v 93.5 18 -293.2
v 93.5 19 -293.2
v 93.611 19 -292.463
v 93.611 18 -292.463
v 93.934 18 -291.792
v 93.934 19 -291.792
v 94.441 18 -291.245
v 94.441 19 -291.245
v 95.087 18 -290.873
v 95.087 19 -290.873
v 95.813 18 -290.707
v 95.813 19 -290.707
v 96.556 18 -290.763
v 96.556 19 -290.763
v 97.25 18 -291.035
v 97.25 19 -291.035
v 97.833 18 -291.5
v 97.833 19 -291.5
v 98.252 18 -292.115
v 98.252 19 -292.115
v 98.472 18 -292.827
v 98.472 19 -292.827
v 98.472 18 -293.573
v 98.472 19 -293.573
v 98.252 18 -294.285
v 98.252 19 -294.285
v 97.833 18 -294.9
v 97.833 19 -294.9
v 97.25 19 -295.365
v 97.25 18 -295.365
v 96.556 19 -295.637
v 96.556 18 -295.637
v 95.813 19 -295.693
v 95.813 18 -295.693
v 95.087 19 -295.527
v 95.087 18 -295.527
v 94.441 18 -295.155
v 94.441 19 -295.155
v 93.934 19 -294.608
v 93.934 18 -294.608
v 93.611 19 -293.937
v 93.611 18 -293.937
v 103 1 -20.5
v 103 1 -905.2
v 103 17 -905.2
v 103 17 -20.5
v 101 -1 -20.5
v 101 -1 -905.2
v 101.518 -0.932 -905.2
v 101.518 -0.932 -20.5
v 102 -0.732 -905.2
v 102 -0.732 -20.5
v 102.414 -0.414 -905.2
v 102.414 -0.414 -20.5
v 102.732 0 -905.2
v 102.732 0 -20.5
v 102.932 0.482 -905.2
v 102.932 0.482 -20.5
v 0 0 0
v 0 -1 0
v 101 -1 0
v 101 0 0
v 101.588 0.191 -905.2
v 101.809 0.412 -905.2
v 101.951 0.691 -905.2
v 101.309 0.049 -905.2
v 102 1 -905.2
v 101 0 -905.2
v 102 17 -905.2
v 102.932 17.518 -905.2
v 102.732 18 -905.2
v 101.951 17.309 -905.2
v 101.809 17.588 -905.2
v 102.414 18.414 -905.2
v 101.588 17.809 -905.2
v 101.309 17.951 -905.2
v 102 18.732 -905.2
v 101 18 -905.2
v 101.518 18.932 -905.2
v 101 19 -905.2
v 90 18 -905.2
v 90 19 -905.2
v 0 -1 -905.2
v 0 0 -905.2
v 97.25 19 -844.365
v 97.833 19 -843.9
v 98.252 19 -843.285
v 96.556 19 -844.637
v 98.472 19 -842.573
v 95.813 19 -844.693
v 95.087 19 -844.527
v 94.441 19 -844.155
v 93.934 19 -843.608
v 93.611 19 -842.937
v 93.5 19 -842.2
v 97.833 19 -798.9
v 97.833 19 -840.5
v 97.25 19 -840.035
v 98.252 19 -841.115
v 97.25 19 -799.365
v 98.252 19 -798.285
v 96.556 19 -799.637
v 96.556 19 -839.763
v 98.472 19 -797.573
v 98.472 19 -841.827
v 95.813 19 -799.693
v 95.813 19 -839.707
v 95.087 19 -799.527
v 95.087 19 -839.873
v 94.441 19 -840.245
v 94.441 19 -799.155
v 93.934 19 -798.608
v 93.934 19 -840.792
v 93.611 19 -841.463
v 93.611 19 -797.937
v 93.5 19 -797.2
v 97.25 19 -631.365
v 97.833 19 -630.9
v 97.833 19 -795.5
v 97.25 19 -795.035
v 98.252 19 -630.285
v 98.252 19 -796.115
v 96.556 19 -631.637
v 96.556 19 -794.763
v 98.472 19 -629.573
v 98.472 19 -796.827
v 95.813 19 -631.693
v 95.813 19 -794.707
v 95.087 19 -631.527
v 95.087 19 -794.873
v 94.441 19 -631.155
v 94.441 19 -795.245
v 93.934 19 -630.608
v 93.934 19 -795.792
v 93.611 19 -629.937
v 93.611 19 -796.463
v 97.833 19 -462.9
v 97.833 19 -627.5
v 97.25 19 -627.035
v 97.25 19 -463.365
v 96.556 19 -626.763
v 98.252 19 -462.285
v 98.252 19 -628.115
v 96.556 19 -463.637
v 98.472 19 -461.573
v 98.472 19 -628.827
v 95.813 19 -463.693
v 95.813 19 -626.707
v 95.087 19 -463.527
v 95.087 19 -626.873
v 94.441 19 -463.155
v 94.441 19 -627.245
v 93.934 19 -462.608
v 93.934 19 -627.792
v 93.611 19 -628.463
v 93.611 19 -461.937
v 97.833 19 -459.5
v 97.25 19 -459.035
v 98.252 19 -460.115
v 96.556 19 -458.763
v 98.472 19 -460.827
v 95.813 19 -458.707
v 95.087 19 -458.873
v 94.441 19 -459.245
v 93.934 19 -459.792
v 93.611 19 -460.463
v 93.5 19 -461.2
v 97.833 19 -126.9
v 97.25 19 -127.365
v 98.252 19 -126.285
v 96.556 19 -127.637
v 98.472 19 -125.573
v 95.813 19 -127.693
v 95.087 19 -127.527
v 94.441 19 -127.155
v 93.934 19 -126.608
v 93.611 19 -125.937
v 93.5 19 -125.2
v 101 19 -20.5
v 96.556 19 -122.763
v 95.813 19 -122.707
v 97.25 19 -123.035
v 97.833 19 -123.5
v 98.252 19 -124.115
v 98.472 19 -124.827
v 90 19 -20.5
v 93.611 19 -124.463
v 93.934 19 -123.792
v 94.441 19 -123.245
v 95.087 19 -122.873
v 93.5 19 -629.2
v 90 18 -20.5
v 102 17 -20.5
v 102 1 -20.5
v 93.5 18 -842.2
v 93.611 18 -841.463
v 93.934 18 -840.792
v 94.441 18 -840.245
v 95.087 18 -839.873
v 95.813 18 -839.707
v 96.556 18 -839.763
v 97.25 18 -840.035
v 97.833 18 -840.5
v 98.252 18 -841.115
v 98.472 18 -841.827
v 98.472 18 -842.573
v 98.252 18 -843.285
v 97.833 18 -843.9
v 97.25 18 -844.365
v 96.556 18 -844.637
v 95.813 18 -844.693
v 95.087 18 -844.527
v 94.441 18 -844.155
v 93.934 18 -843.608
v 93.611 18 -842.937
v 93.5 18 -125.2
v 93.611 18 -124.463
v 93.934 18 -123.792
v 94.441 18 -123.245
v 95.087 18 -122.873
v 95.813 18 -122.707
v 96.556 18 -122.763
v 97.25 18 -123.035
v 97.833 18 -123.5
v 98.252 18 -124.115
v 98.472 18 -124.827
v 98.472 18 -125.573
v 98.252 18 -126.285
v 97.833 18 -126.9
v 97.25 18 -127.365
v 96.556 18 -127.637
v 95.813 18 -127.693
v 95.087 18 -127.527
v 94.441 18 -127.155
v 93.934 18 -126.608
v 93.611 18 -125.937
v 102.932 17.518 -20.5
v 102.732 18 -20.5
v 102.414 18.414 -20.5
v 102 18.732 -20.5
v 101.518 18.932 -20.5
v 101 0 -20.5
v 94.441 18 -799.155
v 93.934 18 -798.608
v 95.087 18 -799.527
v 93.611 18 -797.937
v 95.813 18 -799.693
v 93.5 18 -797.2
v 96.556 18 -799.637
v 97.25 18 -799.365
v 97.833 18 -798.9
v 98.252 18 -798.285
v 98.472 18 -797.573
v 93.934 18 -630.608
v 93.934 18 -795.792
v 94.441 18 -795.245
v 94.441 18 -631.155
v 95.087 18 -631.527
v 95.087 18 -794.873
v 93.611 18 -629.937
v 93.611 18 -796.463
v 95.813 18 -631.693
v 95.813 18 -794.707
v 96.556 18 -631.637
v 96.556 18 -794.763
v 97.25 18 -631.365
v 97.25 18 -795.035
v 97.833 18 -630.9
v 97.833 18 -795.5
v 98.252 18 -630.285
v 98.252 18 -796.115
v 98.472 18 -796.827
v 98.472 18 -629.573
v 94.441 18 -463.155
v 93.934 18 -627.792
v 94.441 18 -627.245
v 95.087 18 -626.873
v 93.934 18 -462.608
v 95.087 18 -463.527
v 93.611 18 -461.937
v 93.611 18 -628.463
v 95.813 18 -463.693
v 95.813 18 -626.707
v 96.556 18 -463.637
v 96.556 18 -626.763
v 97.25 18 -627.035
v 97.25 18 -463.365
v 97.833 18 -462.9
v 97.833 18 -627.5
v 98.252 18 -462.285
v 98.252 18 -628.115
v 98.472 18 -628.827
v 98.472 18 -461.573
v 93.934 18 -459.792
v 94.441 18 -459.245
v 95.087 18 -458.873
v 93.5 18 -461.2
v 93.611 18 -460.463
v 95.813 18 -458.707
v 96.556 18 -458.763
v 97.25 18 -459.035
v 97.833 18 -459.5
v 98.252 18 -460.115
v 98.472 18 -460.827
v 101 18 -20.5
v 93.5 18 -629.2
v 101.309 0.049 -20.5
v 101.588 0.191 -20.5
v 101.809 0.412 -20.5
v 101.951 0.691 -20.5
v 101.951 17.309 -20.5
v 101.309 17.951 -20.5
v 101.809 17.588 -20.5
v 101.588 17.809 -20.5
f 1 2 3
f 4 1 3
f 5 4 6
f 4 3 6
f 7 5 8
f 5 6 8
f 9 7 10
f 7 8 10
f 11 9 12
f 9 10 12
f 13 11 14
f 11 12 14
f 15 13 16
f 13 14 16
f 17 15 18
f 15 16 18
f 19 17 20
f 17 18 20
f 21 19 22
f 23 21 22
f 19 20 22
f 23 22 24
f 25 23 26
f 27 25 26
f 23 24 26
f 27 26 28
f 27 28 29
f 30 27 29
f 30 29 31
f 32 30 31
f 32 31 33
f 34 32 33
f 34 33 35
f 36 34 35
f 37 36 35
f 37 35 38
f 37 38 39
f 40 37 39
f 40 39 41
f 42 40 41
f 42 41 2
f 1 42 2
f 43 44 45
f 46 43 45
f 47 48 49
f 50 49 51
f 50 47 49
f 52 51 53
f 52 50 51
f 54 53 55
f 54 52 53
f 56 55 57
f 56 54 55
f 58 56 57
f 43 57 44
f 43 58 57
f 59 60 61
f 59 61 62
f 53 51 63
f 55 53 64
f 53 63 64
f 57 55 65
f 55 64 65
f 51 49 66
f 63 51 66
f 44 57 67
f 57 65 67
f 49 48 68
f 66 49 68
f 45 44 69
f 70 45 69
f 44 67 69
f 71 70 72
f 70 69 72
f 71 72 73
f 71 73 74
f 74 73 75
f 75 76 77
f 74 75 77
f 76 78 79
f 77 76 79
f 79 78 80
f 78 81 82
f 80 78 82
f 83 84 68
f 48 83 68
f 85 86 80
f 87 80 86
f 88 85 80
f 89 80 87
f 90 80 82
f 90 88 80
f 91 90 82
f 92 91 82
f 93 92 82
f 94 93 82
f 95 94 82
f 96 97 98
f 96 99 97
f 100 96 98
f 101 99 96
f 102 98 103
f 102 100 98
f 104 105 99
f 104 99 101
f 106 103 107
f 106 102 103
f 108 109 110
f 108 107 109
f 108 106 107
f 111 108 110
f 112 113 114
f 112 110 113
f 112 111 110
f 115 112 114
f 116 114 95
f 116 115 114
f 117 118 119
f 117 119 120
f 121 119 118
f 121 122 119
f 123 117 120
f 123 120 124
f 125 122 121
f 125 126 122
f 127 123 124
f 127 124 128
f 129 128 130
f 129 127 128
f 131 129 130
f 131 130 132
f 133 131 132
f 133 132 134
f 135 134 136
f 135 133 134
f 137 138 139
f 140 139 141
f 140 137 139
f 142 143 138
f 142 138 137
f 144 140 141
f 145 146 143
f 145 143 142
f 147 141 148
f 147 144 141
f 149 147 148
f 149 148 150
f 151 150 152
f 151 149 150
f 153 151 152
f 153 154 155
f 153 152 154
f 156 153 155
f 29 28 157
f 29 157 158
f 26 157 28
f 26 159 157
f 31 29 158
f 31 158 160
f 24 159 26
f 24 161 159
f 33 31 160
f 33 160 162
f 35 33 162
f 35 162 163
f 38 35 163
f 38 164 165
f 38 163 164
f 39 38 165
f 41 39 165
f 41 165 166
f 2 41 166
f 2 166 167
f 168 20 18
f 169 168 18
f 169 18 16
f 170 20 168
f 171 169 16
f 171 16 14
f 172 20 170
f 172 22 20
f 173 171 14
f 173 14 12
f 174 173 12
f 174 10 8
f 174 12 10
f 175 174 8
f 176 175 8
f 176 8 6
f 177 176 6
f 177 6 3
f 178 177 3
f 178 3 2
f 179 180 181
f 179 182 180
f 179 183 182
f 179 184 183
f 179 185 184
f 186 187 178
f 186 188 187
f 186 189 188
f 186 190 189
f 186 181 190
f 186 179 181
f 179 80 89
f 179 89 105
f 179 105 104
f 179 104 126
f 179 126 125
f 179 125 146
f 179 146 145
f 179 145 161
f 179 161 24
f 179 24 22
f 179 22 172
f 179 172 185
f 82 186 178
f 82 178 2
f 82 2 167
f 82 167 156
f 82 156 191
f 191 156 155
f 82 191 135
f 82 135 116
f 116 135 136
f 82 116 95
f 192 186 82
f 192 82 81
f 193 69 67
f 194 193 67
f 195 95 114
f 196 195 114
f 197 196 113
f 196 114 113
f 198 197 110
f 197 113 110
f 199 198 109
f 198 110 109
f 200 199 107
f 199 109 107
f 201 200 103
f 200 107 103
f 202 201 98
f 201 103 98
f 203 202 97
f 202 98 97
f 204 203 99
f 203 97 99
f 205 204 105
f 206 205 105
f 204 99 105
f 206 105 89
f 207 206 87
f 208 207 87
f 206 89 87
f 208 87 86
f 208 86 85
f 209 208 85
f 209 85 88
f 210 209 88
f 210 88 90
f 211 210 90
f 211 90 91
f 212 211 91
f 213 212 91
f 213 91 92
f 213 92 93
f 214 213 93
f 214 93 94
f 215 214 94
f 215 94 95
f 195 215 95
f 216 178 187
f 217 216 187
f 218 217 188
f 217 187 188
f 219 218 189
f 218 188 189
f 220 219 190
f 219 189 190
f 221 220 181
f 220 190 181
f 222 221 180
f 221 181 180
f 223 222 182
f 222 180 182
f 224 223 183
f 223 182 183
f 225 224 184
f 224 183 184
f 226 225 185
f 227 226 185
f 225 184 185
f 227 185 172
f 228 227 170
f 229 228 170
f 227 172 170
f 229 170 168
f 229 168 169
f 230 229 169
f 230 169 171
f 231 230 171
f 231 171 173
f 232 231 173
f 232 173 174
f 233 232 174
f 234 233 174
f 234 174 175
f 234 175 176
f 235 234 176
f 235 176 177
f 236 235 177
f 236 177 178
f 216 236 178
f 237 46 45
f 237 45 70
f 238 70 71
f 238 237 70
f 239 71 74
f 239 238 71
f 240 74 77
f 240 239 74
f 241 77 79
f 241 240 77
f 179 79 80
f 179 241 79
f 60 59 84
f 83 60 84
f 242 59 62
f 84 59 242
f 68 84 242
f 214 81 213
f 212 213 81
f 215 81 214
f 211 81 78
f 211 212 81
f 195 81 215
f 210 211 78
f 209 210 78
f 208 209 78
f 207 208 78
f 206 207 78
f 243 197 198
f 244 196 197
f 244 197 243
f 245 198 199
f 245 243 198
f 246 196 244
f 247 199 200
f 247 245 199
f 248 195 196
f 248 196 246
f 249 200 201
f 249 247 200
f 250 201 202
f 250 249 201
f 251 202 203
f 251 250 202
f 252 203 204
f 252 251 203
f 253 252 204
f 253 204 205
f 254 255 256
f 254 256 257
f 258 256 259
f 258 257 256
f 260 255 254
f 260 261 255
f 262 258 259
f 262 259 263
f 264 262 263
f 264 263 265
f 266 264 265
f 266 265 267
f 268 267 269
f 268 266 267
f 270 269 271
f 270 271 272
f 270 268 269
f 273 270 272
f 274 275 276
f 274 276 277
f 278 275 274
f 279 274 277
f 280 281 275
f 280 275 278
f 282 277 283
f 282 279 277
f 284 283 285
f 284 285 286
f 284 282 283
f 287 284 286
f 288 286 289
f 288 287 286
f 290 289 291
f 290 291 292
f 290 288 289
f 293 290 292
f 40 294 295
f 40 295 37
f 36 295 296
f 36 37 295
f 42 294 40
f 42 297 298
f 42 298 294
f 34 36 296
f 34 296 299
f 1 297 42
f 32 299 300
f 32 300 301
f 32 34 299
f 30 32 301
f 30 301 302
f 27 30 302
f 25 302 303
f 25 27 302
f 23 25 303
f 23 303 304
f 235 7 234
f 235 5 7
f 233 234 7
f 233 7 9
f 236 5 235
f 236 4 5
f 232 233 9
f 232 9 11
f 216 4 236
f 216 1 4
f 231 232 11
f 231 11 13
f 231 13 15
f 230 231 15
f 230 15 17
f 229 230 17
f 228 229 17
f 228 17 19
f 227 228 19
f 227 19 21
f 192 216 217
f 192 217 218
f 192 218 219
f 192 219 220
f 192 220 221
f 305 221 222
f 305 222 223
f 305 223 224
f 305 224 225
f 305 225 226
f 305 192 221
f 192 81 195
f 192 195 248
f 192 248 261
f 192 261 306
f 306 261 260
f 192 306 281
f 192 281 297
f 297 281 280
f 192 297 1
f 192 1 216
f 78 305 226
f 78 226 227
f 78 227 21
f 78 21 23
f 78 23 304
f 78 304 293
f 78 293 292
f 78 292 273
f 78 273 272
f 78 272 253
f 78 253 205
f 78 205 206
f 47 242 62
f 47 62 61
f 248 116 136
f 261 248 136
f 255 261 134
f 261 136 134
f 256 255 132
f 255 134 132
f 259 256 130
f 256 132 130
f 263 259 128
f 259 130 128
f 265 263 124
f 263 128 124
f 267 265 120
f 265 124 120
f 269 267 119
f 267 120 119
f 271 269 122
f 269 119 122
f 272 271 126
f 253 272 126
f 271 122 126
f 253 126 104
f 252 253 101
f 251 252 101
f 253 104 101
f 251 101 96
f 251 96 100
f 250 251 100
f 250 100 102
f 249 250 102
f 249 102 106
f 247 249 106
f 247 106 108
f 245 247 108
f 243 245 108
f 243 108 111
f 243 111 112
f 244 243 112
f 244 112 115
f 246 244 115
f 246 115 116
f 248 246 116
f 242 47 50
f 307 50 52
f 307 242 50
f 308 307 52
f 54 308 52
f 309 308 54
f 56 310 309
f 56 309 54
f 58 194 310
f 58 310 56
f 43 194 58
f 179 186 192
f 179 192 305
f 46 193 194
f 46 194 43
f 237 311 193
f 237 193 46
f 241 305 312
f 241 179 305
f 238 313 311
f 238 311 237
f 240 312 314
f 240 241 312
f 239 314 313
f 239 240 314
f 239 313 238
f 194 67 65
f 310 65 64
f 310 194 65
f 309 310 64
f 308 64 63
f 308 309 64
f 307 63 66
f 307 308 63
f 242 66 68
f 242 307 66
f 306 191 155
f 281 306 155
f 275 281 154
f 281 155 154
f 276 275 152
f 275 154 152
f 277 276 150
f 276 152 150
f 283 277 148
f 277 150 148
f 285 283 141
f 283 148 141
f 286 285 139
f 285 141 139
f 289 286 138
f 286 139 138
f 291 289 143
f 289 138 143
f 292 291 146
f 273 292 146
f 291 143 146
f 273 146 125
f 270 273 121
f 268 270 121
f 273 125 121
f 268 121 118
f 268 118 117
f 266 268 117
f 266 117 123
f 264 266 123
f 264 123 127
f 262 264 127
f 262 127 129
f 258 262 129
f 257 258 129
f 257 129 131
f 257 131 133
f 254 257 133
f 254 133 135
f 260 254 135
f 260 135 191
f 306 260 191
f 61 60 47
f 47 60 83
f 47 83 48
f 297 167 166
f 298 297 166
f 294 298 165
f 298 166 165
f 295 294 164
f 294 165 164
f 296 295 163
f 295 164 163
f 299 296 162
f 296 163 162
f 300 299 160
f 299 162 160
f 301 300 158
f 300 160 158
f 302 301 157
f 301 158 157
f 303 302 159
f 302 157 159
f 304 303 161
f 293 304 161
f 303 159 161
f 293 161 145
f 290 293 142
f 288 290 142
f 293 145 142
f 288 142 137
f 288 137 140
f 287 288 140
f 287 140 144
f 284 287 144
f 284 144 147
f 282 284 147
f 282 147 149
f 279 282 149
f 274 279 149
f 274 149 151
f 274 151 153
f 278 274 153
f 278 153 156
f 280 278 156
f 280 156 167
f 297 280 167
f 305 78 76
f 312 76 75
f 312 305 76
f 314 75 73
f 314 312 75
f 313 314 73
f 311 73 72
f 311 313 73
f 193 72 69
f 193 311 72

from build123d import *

# Parameters (mm, degrees)
SKETCH1_W                    = 103
SKETCH1_H                    = 905.2
BASE_FLANGE1_DEPTH           = 1
EDGE_FLANGE1_STRIP_W         = 6
EDGE_FLANGE1_STRIP_H         = 1
EDGE_FLANGE1_STRIP_CUT_DEPTH = 905.2
EDGE_FLANGE1_DEPTH           = 905.2
EDGE_FLANGE2_STRIP_W         = 6
EDGE_FLANGE2_STRIP_H         = 1
EDGE_FLANGE2_STRIP_CUT_DEPTH = 905.2
EDGE_FLANGE2_DEPTH           = 905.2
SKETCH19_R                   = 2.5
CUT_EXTRUDE2_DEPTH           = 10
CUT_EXTRUDE3_START           = -20.5
CUT_EXTRUDE3_DEPTH           = 20.5


# Read off the part's stored shape, not the designer's step: Cut-Extrude3
# Sheet-metal steps are written as plain solids
with BuildPart() as part:
    # Sketch1 → Base-Flange1 (new body)
    with BuildSketch(Plane(origin=(0, 0, 0), x_dir=(1, 0, 0), z_dir=(0, 1, 0))):
        with Locations((51.5, 452.6)):
            Rectangle(SKETCH1_W, SKETCH1_H)
    extrude(amount=-BASE_FLANGE1_DEPTH)

    # Edge-Flange1 strip (across the edge) → Edge-Flange1 strip cut (cut)
    with BuildSketch(Plane(origin=(103, 0, 0), x_dir=(-1, 0, 0), z_dir=(0, 0, -1))):
        with Locations((-1, -0.5)):
            Rectangle(EDGE_FLANGE1_STRIP_W, EDGE_FLANGE1_STRIP_H)
    extrude(amount=EDGE_FLANGE1_STRIP_CUT_DEPTH, mode=Mode.SUBTRACT)

    # Edge-Flange1 section (across the edge) → Edge-Flange1 (add)
    with BuildSketch(Plane(origin=(103, 0, 0), x_dir=(-1, 0, 0), z_dir=(0, 0, -1))):
        with BuildLine():
            Line((0, 1), (0, 19))
            Line((0, 19), (1, 19))
            Line((1, 19), (1, 1))
            ThreePointArc((1, 1), (1.292893219, 0.292893219), (2, 0))
            Line((2, 0), (2, -1))
            ThreePointArc((2, -1), (0.585786438, -0.414213562), (0, 1))
        make_face()
    extrude(amount=EDGE_FLANGE1_DEPTH)

    # Edge-Flange2 strip (across the edge) → Edge-Flange2 strip cut (cut)
    with BuildSketch(Plane(origin=(102, 19, 0), x_dir=(0, -1, 0), z_dir=(0, 0, -1))):
        with Locations((-1, -0.5)):
            Rectangle(EDGE_FLANGE2_STRIP_W, EDGE_FLANGE2_STRIP_H)
    extrude(amount=EDGE_FLANGE2_STRIP_CUT_DEPTH, mode=Mode.SUBTRACT)

    # Edge-Flange2 section (across the edge) → Edge-Flange2 (add)
    with BuildSketch(Plane(origin=(102, 19, 0), x_dir=(0, -1, 0), z_dir=(0, 0, -1))):
        with BuildLine():
            Line((0, 1), (0, 12))
            Line((0, 12), (1, 12))
            Line((1, 12), (1, 1))
            ThreePointArc((1, 1), (1.292893219, 0.292893219), (2, 0))
            Line((2, 0), (2, -1))
            ThreePointArc((2, -1), (0.585786438, -0.414213562), (0, 1))
        make_face()
    extrude(amount=EDGE_FLANGE2_DEPTH)

    # Sketch19 → Cut-Extrude2 (cut)
    with BuildSketch(Plane(origin=(0, 19, 0), x_dir=(1, 0, 0), z_dir=(0, 1, 0))):
        with Locations(Location((96, 842.2, 0), (0, 0, 180))):
            Circle(SKETCH19_R)
        with Locations(Location((96, 797.2, 0), (0, 0, 180))):
            Circle(SKETCH19_R)
        with Locations(Location((96, 629.2, 0), (0, 0, 180))):
            Circle(SKETCH19_R)
        with Locations(Location((96, 461.2, 0), (0, 0, 180))):
            Circle(SKETCH19_R)
        with Locations(Location((96, 293.2, 0), (0, 0, 180))):
            Circle(SKETCH19_R)
        with Locations(Location((96, 125.2, 0), (0, 0, 180))):
            Circle(SKETCH19_R)
    extrude(amount=-CUT_EXTRUDE2_DEPTH, mode=Mode.SUBTRACT)

    # Cut-Extrude3 outline → Cut-Extrude3 (cut)
    with BuildSketch(Plane.XY.offset(CUT_EXTRUDE3_START)):
        with BuildLine():
            ThreePointArc((102, 1), (101.707106781, 0.292893219), (101, 0))
            Line((101, 0), (101, -1))
            ThreePointArc((101, -1), (102.414213562, -0.414213562), (103, 1))
            Line((103, 1), (103, 17))
            ThreePointArc((103, 17), (102.414213562, 18.414213562), (101, 19))
            Line((101, 19), (90, 19))
            Line((90, 19), (90, 18))
            Line((90, 18), (101, 18))
            ThreePointArc((101, 18), (101.707106781, 17.707106781), (102, 17))
            Line((102, 17), (102, 1))
        make_face()
    extrude(amount=CUT_EXTRUDE3_DEPTH, mode=Mode.SUBTRACT)


solid = part.part
